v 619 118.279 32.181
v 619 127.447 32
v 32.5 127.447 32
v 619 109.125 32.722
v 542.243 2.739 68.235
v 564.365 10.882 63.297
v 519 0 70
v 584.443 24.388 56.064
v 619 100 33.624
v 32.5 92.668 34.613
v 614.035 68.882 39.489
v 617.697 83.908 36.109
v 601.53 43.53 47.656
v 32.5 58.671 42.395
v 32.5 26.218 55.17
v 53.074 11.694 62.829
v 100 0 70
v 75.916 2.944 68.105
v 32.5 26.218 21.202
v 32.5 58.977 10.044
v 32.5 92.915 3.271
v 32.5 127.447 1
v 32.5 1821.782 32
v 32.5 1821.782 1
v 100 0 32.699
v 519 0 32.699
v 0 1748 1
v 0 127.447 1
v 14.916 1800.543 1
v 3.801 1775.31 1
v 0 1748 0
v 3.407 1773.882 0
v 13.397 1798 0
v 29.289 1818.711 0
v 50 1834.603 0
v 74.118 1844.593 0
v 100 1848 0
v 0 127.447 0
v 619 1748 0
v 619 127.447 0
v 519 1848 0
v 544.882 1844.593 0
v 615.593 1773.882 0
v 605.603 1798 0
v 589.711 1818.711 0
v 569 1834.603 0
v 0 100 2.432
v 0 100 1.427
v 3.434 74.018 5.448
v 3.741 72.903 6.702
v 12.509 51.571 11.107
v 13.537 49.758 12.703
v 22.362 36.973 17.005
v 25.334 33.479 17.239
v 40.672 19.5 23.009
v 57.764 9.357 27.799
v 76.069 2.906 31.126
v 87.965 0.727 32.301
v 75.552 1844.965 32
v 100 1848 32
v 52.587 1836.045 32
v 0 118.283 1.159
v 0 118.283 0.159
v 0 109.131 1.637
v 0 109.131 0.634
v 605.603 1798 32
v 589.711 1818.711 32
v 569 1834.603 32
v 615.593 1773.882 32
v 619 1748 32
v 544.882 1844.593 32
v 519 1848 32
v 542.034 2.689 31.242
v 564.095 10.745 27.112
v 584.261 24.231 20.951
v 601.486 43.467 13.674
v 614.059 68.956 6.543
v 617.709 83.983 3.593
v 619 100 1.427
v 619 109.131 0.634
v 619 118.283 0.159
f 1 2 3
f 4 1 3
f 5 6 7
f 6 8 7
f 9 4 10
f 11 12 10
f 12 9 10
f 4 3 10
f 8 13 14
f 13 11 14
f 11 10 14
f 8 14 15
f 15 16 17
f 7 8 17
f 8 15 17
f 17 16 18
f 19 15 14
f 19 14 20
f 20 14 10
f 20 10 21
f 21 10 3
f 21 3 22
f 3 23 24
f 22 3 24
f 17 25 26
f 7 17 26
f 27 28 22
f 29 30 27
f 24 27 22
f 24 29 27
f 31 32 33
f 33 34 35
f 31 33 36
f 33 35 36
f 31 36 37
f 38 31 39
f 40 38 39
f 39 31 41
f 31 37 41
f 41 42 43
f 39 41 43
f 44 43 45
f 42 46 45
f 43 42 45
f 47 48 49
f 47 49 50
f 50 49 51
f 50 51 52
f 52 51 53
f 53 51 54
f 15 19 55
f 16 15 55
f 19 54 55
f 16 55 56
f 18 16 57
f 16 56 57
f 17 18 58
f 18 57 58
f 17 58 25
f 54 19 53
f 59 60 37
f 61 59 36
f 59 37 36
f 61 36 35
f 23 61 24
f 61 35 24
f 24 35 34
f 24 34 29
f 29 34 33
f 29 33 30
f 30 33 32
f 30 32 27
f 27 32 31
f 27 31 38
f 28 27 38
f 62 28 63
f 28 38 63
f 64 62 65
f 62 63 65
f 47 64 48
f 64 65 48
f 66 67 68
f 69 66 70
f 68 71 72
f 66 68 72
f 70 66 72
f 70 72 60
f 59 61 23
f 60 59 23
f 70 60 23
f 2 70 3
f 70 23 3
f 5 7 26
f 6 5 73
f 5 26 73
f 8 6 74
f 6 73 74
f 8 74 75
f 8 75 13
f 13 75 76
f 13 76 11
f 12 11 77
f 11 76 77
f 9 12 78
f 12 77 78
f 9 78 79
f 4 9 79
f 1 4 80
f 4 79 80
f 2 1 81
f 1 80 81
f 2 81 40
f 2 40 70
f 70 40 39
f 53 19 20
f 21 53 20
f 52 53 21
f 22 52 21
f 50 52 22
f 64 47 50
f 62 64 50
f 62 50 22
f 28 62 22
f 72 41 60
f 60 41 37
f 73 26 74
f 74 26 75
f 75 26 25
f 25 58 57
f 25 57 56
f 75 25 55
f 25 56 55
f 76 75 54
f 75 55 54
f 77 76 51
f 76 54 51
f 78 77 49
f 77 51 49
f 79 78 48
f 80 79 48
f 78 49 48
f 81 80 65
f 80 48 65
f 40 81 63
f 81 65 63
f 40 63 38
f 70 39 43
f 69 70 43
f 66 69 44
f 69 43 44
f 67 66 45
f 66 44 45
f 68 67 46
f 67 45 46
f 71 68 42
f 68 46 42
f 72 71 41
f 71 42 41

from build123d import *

# Parameters (mm, degrees)
BOSS_EXTRUDE1_DEPTH = 70
CUT_EXTRUDE1_DEPTH  = 1951.170505366
CUT_EXTRUDE2_DEPTH  = 32.5


with BuildPart() as part:
    # Sketch1 → Boss-Extrude1 (new body)
    with BuildSketch(Plane.XY):
        with BuildLine():
            Line((100, 0), (519, 0))
            ThreePointArc((519, 0), (589.710678119, 29.289321881), (619, 100))
            Line((619, 100), (619, 1748))
            ThreePointArc((619, 1748), (589.710678119, 1818.710678119), (519, 1848))
            Line((519, 1848), (100, 1848))
            ThreePointArc((100, 1848), (29.289321881, 1818.710678119), (0, 1748))
            Line((0, 1748), (0, 100))
            ThreePointArc((0, 100), (29.289321881, 29.289321881), (100, 0))
        make_face()
    extrude(amount=BOSS_EXTRUDE1_DEPTH)

    # Sketch2 → Cut-Extrude1 (cut, through all)
    with BuildSketch(Plane.ZY):
        with BuildLine():
            Line((70, 1848), (32, 1848))
            Line((32, 1848), (32, 127.446930132))
            ThreePointArc((32, 127.446930132), (41.702246447, 60.951215984), (70, 0))
            Line((70, 0), (70, 1848))
        make_face()
        with BuildLine():
            Line((0, 0), (32.698538924, 0))
            ThreePointArc((32.698538924, 0), (8.304907254, 61.659555872), (0, 127.446930132))
            Line((0, 127.446930132), (0, 0))
        make_face()
    extrude(amount=-CUT_EXTRUDE1_DEPTH, mode=Mode.SUBTRACT)

    # Sketch4 → Cut-Extrude2 (cut)
    with BuildSketch(Plane.ZY):
        with BuildLine():
            Line((1, 1848), (32, 1848))
            Line((32, 1848), (32, 127.446930132))
            ThreePointArc((32, 127.446930132), (41.702246447, 60.951215984), (70, 0))
            Line((70, 0), (33.840121275, 0))
            ThreePointArc((33.840121275, 0), (9.341966472, 61.641927348), (1, 127.446930132))
            Line((1, 127.446930132), (1, 1848))
        make_face()
    extrude(amount=-CUT_EXTRUDE2_DEPTH, mode=Mode.SUBTRACT)


solid = part.part
